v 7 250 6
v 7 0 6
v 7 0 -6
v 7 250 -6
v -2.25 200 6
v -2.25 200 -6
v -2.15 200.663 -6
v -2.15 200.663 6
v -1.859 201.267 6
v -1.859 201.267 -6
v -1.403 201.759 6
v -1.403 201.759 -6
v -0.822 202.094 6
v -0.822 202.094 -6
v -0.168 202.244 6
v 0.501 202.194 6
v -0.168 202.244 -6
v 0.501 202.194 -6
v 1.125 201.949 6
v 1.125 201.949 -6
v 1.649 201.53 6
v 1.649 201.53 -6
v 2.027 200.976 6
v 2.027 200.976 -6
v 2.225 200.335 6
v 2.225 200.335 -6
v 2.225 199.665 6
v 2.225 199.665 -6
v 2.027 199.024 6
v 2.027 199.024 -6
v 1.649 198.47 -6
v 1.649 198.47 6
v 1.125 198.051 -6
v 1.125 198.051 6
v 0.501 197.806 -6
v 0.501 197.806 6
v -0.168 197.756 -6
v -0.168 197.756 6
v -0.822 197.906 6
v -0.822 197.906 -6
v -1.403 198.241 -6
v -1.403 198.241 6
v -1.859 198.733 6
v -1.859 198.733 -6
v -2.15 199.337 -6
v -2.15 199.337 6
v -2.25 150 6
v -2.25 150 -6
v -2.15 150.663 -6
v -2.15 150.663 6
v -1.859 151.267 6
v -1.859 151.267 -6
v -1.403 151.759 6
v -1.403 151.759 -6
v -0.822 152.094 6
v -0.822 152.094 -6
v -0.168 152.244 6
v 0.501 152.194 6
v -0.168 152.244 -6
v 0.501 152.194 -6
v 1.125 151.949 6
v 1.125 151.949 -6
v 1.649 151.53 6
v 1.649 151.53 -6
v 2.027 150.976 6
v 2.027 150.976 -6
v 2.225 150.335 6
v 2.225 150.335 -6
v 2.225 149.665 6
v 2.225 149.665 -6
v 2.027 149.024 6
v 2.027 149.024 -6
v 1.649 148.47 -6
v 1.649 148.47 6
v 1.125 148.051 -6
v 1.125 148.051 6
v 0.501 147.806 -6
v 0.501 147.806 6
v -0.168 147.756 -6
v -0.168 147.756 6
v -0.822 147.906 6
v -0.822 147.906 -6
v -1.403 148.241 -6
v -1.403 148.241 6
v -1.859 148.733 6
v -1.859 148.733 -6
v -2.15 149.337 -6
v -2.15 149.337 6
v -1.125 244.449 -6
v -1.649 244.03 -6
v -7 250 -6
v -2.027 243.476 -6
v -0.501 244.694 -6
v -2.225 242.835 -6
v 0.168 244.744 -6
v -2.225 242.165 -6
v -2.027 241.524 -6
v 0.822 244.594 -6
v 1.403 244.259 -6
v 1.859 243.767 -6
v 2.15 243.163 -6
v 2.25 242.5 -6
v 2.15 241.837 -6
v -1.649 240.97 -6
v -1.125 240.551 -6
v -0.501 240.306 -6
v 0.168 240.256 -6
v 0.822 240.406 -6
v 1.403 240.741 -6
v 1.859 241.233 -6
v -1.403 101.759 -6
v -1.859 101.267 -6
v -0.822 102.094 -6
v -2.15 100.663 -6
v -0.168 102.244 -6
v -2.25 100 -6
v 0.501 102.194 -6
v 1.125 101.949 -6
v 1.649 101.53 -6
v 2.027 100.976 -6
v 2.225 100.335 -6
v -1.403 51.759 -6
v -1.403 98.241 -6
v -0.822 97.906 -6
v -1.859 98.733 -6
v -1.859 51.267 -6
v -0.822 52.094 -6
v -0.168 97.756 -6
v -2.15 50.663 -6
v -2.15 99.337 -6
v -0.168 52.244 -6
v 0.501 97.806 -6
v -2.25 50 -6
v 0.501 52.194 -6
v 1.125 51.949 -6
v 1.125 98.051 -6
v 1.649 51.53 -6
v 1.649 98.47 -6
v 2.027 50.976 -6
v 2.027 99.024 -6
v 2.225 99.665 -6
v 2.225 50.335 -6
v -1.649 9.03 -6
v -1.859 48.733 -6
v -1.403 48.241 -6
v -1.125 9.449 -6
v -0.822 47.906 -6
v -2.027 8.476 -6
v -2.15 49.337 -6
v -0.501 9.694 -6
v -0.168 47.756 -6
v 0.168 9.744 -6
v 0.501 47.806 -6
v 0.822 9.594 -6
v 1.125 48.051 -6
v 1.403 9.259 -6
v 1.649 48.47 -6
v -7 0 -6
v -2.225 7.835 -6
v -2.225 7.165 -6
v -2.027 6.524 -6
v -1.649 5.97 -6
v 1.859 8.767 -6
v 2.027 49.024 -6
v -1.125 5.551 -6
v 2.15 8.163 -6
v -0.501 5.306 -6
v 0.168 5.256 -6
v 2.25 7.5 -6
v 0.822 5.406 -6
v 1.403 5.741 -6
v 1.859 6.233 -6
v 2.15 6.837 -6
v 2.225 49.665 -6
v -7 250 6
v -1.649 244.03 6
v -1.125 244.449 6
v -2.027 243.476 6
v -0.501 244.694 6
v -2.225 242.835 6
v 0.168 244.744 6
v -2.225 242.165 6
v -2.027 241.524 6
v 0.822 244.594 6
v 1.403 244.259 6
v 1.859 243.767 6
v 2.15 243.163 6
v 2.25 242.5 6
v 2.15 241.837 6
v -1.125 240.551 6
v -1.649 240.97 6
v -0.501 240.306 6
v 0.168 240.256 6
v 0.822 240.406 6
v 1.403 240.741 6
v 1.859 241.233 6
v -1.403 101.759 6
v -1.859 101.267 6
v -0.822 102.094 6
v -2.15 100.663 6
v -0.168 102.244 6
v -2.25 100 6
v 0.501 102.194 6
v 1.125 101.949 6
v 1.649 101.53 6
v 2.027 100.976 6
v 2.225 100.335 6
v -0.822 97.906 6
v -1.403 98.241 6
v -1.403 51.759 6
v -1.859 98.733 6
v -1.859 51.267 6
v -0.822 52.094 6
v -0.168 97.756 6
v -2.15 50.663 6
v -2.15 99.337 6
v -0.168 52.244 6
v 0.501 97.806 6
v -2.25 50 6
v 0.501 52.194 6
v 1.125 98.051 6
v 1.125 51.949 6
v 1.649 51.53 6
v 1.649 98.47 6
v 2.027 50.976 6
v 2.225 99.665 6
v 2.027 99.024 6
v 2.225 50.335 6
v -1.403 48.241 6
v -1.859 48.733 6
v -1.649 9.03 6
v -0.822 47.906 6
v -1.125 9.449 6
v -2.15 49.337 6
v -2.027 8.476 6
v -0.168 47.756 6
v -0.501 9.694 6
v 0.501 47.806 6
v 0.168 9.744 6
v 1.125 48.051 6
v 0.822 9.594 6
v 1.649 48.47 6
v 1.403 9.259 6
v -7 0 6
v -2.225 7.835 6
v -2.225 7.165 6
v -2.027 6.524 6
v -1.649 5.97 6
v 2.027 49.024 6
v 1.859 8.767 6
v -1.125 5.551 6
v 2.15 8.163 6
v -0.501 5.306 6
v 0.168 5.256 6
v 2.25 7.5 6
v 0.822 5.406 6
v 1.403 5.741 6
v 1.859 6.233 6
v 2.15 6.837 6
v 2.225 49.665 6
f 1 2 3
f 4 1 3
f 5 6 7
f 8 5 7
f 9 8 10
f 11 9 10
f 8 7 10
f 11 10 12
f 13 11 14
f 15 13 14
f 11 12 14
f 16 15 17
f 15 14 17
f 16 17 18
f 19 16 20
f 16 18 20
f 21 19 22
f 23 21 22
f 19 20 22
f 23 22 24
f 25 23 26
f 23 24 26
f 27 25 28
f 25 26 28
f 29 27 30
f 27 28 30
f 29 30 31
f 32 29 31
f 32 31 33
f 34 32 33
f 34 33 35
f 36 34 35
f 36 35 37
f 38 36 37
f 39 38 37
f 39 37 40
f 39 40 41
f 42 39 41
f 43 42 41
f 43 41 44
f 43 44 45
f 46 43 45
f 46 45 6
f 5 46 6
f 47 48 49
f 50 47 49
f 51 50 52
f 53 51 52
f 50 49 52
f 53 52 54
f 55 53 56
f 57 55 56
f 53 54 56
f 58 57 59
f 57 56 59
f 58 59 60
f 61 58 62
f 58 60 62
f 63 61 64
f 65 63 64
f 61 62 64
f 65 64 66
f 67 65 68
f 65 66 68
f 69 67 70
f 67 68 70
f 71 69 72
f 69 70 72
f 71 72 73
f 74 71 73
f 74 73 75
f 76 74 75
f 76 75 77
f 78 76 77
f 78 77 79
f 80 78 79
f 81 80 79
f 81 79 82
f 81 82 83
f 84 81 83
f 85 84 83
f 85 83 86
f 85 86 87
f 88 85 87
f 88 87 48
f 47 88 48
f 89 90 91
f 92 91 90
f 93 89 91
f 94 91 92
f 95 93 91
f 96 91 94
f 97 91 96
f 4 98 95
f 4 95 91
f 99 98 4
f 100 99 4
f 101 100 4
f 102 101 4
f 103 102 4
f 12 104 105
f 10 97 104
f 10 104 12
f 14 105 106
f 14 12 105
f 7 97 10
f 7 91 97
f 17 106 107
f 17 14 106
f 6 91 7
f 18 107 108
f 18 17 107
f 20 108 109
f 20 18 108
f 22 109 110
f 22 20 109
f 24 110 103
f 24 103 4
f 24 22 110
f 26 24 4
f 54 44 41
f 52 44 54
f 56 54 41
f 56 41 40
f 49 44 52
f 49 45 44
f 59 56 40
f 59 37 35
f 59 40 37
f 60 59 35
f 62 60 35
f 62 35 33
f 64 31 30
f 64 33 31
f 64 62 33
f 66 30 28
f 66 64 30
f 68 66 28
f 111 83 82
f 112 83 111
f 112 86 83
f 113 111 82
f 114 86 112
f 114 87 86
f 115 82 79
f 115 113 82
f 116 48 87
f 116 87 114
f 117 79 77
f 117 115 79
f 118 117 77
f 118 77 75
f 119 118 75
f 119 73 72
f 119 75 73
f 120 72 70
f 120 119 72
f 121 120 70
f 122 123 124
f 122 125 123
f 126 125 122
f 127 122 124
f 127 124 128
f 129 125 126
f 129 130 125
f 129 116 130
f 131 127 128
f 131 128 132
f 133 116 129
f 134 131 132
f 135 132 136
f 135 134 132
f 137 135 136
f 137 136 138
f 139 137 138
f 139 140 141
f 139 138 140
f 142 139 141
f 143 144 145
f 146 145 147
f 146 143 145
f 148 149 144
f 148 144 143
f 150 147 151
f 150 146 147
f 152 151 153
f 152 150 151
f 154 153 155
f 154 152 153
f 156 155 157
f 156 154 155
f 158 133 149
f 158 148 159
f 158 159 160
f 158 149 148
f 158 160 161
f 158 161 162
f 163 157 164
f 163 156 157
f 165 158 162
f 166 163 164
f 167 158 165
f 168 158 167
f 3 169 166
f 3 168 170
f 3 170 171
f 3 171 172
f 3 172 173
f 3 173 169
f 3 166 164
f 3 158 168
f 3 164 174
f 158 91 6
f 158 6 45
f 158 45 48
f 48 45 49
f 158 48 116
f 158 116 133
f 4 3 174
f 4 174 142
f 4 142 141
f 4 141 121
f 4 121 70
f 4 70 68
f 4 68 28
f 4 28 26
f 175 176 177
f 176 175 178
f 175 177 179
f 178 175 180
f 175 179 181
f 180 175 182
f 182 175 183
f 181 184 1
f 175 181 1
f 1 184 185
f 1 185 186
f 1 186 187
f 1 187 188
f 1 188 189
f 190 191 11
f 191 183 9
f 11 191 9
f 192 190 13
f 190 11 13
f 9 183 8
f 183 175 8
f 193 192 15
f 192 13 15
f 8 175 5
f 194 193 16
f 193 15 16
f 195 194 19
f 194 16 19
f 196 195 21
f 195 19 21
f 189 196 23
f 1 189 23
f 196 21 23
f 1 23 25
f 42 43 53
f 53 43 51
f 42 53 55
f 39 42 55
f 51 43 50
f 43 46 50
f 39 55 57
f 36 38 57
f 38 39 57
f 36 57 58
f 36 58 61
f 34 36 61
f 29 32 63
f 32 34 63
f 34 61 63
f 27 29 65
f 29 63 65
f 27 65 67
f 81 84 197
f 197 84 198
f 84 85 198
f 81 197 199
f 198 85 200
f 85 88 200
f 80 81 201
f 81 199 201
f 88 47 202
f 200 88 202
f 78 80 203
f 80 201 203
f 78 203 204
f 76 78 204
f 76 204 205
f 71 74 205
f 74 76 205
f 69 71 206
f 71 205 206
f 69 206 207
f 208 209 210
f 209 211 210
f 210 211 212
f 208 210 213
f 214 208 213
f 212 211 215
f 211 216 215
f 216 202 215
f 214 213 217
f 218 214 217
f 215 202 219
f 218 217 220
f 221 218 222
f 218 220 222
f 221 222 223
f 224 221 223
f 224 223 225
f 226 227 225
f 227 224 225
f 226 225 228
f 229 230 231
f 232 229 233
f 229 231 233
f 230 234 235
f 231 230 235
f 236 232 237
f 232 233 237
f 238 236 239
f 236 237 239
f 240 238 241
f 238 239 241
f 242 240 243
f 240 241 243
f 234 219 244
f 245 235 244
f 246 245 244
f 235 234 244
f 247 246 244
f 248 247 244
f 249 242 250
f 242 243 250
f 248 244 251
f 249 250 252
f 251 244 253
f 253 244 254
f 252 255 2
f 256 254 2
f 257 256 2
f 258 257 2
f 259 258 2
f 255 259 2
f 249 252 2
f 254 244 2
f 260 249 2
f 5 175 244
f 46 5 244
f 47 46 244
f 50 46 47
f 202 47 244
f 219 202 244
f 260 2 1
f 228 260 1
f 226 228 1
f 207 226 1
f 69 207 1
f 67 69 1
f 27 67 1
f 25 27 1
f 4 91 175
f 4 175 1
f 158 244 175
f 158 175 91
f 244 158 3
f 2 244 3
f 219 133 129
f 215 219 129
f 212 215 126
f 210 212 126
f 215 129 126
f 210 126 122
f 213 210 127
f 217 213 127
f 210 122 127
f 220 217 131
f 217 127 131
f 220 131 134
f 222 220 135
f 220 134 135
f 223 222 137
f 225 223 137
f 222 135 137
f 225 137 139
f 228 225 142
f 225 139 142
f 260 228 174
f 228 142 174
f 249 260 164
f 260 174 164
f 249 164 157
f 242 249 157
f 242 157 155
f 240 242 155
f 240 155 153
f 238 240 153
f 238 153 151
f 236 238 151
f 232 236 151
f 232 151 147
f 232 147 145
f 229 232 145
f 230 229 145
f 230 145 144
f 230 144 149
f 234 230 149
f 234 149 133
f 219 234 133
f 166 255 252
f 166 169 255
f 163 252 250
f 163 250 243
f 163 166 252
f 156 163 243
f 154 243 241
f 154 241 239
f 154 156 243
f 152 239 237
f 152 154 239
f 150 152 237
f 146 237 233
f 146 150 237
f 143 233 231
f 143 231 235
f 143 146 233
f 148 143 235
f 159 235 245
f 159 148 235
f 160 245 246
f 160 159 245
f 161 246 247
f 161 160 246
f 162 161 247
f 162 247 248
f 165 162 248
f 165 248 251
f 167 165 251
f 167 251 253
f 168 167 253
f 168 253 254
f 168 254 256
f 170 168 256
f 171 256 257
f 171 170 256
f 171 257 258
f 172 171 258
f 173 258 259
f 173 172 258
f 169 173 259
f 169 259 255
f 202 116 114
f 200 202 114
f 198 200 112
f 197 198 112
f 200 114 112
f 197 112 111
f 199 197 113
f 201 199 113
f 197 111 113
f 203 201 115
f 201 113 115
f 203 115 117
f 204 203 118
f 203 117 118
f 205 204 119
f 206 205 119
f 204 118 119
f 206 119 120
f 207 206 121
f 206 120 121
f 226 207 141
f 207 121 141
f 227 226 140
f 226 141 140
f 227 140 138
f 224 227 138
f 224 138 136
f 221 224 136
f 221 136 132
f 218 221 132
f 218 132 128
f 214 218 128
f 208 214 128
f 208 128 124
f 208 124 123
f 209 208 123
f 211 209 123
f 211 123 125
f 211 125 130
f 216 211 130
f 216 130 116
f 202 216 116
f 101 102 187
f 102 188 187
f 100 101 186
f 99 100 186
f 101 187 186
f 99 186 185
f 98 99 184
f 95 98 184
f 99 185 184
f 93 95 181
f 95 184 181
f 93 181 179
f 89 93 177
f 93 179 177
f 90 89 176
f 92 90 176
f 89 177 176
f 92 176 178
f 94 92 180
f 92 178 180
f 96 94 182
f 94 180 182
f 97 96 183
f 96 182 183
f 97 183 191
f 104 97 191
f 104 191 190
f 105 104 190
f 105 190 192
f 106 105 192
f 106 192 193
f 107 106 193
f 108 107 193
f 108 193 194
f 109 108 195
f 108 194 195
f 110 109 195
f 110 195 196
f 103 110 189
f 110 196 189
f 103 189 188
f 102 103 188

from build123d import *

# Parameters (mm, degrees)
SKETCH1_W           = 14
SKETCH1_H           = 12
BOSS_EXTRUDE1_DEPTH = 250
SKETCH2_R           = 2.25
CUT_EXTRUDE1_DEPTH  = 6
CUT_EXTRUDE2_REACH  = 252.386
SKETCH3_R           = 2.25


with BuildPart() as part:
    # Sketch1 → Boss-Extrude1 (new body)
    with BuildSketch(Plane(origin=(0, 0, 0), x_dir=(1, 0, 0), z_dir=(0, 1, 0))):
        Rectangle(SKETCH1_W, SKETCH1_H)
    extrude(amount=BOSS_EXTRUDE1_DEPTH)

    # Sketch2 → Cut-Extrude1 (cut, symmetric)
    with BuildSketch(Plane.XY):
        with Locations((0, 7.5)):
            Circle(SKETCH2_R)
        with Locations((0, 242.5)):
            Circle(SKETCH2_R)
    extrude(amount=CUT_EXTRUDE1_DEPTH, both=True, mode=Mode.SUBTRACT)

    # Sketch3 → Cut-Extrude2 (cut, up to next)
    with BuildSketch(Plane(origin=(0, 0, -6), x_dir=(-1, 0, 0), z_dir=(0, 0, -1)), mode=Mode.PRIVATE) as cut_extrude2_sk1:
        with Locations((0, 200)):
            Circle(SKETCH3_R)
    cut_extrude2_tool1 = extrude(cut_extrude2_sk1.sketch, amount=-CUT_EXTRUDE2_REACH, mode=Mode.PRIVATE) & part.part
    # Sketch3 → Cut-Extrude2 (cut, up to next)
    with BuildSketch(Plane(origin=(0, 0, -6), x_dir=(-1, 0, 0), z_dir=(0, 0, -1)), mode=Mode.PRIVATE) as cut_extrude2_sk2:
        with Locations((0, 150)):
            Circle(SKETCH3_R)
    cut_extrude2_tool2 = extrude(cut_extrude2_sk2.sketch, amount=-CUT_EXTRUDE2_REACH, mode=Mode.PRIVATE) & part.part
    # Sketch3 → Cut-Extrude2 (cut, up to next)
    with BuildSketch(Plane(origin=(0, 0, -6), x_dir=(-1, 0, 0), z_dir=(0, 0, -1)), mode=Mode.PRIVATE) as cut_extrude2_sk3:
        with Locations((0, 100)):
            Circle(SKETCH3_R)
    cut_extrude2_tool3 = extrude(cut_extrude2_sk3.sketch, amount=-CUT_EXTRUDE2_REACH, mode=Mode.PRIVATE) & part.part
    # Sketch3 → Cut-Extrude2 (cut, up to next)
    with BuildSketch(Plane(origin=(0, 0, -6), x_dir=(-1, 0, 0), z_dir=(0, 0, -1)), mode=Mode.PRIVATE) as cut_extrude2_sk4:
        with Locations((0, 50)):
            Circle(SKETCH3_R)
    cut_extrude2_tool4 = extrude(cut_extrude2_sk4.sketch, amount=-CUT_EXTRUDE2_REACH, mode=Mode.PRIVATE) & part.part
    add(cut_extrude2_tool1.solids().sort_by_distance((0, 200, -6))[0], mode=Mode.SUBTRACT)
    add(cut_extrude2_tool2.solids().sort_by_distance((0, 150, -6))[0], mode=Mode.SUBTRACT)
    add(cut_extrude2_tool3.solids().sort_by_distance((0, 100, -6))[0], mode=Mode.SUBTRACT)
    add(cut_extrude2_tool4.solids().sort_by_distance((0, 50, -6))[0], mode=Mode.SUBTRACT)


solid = part.part
